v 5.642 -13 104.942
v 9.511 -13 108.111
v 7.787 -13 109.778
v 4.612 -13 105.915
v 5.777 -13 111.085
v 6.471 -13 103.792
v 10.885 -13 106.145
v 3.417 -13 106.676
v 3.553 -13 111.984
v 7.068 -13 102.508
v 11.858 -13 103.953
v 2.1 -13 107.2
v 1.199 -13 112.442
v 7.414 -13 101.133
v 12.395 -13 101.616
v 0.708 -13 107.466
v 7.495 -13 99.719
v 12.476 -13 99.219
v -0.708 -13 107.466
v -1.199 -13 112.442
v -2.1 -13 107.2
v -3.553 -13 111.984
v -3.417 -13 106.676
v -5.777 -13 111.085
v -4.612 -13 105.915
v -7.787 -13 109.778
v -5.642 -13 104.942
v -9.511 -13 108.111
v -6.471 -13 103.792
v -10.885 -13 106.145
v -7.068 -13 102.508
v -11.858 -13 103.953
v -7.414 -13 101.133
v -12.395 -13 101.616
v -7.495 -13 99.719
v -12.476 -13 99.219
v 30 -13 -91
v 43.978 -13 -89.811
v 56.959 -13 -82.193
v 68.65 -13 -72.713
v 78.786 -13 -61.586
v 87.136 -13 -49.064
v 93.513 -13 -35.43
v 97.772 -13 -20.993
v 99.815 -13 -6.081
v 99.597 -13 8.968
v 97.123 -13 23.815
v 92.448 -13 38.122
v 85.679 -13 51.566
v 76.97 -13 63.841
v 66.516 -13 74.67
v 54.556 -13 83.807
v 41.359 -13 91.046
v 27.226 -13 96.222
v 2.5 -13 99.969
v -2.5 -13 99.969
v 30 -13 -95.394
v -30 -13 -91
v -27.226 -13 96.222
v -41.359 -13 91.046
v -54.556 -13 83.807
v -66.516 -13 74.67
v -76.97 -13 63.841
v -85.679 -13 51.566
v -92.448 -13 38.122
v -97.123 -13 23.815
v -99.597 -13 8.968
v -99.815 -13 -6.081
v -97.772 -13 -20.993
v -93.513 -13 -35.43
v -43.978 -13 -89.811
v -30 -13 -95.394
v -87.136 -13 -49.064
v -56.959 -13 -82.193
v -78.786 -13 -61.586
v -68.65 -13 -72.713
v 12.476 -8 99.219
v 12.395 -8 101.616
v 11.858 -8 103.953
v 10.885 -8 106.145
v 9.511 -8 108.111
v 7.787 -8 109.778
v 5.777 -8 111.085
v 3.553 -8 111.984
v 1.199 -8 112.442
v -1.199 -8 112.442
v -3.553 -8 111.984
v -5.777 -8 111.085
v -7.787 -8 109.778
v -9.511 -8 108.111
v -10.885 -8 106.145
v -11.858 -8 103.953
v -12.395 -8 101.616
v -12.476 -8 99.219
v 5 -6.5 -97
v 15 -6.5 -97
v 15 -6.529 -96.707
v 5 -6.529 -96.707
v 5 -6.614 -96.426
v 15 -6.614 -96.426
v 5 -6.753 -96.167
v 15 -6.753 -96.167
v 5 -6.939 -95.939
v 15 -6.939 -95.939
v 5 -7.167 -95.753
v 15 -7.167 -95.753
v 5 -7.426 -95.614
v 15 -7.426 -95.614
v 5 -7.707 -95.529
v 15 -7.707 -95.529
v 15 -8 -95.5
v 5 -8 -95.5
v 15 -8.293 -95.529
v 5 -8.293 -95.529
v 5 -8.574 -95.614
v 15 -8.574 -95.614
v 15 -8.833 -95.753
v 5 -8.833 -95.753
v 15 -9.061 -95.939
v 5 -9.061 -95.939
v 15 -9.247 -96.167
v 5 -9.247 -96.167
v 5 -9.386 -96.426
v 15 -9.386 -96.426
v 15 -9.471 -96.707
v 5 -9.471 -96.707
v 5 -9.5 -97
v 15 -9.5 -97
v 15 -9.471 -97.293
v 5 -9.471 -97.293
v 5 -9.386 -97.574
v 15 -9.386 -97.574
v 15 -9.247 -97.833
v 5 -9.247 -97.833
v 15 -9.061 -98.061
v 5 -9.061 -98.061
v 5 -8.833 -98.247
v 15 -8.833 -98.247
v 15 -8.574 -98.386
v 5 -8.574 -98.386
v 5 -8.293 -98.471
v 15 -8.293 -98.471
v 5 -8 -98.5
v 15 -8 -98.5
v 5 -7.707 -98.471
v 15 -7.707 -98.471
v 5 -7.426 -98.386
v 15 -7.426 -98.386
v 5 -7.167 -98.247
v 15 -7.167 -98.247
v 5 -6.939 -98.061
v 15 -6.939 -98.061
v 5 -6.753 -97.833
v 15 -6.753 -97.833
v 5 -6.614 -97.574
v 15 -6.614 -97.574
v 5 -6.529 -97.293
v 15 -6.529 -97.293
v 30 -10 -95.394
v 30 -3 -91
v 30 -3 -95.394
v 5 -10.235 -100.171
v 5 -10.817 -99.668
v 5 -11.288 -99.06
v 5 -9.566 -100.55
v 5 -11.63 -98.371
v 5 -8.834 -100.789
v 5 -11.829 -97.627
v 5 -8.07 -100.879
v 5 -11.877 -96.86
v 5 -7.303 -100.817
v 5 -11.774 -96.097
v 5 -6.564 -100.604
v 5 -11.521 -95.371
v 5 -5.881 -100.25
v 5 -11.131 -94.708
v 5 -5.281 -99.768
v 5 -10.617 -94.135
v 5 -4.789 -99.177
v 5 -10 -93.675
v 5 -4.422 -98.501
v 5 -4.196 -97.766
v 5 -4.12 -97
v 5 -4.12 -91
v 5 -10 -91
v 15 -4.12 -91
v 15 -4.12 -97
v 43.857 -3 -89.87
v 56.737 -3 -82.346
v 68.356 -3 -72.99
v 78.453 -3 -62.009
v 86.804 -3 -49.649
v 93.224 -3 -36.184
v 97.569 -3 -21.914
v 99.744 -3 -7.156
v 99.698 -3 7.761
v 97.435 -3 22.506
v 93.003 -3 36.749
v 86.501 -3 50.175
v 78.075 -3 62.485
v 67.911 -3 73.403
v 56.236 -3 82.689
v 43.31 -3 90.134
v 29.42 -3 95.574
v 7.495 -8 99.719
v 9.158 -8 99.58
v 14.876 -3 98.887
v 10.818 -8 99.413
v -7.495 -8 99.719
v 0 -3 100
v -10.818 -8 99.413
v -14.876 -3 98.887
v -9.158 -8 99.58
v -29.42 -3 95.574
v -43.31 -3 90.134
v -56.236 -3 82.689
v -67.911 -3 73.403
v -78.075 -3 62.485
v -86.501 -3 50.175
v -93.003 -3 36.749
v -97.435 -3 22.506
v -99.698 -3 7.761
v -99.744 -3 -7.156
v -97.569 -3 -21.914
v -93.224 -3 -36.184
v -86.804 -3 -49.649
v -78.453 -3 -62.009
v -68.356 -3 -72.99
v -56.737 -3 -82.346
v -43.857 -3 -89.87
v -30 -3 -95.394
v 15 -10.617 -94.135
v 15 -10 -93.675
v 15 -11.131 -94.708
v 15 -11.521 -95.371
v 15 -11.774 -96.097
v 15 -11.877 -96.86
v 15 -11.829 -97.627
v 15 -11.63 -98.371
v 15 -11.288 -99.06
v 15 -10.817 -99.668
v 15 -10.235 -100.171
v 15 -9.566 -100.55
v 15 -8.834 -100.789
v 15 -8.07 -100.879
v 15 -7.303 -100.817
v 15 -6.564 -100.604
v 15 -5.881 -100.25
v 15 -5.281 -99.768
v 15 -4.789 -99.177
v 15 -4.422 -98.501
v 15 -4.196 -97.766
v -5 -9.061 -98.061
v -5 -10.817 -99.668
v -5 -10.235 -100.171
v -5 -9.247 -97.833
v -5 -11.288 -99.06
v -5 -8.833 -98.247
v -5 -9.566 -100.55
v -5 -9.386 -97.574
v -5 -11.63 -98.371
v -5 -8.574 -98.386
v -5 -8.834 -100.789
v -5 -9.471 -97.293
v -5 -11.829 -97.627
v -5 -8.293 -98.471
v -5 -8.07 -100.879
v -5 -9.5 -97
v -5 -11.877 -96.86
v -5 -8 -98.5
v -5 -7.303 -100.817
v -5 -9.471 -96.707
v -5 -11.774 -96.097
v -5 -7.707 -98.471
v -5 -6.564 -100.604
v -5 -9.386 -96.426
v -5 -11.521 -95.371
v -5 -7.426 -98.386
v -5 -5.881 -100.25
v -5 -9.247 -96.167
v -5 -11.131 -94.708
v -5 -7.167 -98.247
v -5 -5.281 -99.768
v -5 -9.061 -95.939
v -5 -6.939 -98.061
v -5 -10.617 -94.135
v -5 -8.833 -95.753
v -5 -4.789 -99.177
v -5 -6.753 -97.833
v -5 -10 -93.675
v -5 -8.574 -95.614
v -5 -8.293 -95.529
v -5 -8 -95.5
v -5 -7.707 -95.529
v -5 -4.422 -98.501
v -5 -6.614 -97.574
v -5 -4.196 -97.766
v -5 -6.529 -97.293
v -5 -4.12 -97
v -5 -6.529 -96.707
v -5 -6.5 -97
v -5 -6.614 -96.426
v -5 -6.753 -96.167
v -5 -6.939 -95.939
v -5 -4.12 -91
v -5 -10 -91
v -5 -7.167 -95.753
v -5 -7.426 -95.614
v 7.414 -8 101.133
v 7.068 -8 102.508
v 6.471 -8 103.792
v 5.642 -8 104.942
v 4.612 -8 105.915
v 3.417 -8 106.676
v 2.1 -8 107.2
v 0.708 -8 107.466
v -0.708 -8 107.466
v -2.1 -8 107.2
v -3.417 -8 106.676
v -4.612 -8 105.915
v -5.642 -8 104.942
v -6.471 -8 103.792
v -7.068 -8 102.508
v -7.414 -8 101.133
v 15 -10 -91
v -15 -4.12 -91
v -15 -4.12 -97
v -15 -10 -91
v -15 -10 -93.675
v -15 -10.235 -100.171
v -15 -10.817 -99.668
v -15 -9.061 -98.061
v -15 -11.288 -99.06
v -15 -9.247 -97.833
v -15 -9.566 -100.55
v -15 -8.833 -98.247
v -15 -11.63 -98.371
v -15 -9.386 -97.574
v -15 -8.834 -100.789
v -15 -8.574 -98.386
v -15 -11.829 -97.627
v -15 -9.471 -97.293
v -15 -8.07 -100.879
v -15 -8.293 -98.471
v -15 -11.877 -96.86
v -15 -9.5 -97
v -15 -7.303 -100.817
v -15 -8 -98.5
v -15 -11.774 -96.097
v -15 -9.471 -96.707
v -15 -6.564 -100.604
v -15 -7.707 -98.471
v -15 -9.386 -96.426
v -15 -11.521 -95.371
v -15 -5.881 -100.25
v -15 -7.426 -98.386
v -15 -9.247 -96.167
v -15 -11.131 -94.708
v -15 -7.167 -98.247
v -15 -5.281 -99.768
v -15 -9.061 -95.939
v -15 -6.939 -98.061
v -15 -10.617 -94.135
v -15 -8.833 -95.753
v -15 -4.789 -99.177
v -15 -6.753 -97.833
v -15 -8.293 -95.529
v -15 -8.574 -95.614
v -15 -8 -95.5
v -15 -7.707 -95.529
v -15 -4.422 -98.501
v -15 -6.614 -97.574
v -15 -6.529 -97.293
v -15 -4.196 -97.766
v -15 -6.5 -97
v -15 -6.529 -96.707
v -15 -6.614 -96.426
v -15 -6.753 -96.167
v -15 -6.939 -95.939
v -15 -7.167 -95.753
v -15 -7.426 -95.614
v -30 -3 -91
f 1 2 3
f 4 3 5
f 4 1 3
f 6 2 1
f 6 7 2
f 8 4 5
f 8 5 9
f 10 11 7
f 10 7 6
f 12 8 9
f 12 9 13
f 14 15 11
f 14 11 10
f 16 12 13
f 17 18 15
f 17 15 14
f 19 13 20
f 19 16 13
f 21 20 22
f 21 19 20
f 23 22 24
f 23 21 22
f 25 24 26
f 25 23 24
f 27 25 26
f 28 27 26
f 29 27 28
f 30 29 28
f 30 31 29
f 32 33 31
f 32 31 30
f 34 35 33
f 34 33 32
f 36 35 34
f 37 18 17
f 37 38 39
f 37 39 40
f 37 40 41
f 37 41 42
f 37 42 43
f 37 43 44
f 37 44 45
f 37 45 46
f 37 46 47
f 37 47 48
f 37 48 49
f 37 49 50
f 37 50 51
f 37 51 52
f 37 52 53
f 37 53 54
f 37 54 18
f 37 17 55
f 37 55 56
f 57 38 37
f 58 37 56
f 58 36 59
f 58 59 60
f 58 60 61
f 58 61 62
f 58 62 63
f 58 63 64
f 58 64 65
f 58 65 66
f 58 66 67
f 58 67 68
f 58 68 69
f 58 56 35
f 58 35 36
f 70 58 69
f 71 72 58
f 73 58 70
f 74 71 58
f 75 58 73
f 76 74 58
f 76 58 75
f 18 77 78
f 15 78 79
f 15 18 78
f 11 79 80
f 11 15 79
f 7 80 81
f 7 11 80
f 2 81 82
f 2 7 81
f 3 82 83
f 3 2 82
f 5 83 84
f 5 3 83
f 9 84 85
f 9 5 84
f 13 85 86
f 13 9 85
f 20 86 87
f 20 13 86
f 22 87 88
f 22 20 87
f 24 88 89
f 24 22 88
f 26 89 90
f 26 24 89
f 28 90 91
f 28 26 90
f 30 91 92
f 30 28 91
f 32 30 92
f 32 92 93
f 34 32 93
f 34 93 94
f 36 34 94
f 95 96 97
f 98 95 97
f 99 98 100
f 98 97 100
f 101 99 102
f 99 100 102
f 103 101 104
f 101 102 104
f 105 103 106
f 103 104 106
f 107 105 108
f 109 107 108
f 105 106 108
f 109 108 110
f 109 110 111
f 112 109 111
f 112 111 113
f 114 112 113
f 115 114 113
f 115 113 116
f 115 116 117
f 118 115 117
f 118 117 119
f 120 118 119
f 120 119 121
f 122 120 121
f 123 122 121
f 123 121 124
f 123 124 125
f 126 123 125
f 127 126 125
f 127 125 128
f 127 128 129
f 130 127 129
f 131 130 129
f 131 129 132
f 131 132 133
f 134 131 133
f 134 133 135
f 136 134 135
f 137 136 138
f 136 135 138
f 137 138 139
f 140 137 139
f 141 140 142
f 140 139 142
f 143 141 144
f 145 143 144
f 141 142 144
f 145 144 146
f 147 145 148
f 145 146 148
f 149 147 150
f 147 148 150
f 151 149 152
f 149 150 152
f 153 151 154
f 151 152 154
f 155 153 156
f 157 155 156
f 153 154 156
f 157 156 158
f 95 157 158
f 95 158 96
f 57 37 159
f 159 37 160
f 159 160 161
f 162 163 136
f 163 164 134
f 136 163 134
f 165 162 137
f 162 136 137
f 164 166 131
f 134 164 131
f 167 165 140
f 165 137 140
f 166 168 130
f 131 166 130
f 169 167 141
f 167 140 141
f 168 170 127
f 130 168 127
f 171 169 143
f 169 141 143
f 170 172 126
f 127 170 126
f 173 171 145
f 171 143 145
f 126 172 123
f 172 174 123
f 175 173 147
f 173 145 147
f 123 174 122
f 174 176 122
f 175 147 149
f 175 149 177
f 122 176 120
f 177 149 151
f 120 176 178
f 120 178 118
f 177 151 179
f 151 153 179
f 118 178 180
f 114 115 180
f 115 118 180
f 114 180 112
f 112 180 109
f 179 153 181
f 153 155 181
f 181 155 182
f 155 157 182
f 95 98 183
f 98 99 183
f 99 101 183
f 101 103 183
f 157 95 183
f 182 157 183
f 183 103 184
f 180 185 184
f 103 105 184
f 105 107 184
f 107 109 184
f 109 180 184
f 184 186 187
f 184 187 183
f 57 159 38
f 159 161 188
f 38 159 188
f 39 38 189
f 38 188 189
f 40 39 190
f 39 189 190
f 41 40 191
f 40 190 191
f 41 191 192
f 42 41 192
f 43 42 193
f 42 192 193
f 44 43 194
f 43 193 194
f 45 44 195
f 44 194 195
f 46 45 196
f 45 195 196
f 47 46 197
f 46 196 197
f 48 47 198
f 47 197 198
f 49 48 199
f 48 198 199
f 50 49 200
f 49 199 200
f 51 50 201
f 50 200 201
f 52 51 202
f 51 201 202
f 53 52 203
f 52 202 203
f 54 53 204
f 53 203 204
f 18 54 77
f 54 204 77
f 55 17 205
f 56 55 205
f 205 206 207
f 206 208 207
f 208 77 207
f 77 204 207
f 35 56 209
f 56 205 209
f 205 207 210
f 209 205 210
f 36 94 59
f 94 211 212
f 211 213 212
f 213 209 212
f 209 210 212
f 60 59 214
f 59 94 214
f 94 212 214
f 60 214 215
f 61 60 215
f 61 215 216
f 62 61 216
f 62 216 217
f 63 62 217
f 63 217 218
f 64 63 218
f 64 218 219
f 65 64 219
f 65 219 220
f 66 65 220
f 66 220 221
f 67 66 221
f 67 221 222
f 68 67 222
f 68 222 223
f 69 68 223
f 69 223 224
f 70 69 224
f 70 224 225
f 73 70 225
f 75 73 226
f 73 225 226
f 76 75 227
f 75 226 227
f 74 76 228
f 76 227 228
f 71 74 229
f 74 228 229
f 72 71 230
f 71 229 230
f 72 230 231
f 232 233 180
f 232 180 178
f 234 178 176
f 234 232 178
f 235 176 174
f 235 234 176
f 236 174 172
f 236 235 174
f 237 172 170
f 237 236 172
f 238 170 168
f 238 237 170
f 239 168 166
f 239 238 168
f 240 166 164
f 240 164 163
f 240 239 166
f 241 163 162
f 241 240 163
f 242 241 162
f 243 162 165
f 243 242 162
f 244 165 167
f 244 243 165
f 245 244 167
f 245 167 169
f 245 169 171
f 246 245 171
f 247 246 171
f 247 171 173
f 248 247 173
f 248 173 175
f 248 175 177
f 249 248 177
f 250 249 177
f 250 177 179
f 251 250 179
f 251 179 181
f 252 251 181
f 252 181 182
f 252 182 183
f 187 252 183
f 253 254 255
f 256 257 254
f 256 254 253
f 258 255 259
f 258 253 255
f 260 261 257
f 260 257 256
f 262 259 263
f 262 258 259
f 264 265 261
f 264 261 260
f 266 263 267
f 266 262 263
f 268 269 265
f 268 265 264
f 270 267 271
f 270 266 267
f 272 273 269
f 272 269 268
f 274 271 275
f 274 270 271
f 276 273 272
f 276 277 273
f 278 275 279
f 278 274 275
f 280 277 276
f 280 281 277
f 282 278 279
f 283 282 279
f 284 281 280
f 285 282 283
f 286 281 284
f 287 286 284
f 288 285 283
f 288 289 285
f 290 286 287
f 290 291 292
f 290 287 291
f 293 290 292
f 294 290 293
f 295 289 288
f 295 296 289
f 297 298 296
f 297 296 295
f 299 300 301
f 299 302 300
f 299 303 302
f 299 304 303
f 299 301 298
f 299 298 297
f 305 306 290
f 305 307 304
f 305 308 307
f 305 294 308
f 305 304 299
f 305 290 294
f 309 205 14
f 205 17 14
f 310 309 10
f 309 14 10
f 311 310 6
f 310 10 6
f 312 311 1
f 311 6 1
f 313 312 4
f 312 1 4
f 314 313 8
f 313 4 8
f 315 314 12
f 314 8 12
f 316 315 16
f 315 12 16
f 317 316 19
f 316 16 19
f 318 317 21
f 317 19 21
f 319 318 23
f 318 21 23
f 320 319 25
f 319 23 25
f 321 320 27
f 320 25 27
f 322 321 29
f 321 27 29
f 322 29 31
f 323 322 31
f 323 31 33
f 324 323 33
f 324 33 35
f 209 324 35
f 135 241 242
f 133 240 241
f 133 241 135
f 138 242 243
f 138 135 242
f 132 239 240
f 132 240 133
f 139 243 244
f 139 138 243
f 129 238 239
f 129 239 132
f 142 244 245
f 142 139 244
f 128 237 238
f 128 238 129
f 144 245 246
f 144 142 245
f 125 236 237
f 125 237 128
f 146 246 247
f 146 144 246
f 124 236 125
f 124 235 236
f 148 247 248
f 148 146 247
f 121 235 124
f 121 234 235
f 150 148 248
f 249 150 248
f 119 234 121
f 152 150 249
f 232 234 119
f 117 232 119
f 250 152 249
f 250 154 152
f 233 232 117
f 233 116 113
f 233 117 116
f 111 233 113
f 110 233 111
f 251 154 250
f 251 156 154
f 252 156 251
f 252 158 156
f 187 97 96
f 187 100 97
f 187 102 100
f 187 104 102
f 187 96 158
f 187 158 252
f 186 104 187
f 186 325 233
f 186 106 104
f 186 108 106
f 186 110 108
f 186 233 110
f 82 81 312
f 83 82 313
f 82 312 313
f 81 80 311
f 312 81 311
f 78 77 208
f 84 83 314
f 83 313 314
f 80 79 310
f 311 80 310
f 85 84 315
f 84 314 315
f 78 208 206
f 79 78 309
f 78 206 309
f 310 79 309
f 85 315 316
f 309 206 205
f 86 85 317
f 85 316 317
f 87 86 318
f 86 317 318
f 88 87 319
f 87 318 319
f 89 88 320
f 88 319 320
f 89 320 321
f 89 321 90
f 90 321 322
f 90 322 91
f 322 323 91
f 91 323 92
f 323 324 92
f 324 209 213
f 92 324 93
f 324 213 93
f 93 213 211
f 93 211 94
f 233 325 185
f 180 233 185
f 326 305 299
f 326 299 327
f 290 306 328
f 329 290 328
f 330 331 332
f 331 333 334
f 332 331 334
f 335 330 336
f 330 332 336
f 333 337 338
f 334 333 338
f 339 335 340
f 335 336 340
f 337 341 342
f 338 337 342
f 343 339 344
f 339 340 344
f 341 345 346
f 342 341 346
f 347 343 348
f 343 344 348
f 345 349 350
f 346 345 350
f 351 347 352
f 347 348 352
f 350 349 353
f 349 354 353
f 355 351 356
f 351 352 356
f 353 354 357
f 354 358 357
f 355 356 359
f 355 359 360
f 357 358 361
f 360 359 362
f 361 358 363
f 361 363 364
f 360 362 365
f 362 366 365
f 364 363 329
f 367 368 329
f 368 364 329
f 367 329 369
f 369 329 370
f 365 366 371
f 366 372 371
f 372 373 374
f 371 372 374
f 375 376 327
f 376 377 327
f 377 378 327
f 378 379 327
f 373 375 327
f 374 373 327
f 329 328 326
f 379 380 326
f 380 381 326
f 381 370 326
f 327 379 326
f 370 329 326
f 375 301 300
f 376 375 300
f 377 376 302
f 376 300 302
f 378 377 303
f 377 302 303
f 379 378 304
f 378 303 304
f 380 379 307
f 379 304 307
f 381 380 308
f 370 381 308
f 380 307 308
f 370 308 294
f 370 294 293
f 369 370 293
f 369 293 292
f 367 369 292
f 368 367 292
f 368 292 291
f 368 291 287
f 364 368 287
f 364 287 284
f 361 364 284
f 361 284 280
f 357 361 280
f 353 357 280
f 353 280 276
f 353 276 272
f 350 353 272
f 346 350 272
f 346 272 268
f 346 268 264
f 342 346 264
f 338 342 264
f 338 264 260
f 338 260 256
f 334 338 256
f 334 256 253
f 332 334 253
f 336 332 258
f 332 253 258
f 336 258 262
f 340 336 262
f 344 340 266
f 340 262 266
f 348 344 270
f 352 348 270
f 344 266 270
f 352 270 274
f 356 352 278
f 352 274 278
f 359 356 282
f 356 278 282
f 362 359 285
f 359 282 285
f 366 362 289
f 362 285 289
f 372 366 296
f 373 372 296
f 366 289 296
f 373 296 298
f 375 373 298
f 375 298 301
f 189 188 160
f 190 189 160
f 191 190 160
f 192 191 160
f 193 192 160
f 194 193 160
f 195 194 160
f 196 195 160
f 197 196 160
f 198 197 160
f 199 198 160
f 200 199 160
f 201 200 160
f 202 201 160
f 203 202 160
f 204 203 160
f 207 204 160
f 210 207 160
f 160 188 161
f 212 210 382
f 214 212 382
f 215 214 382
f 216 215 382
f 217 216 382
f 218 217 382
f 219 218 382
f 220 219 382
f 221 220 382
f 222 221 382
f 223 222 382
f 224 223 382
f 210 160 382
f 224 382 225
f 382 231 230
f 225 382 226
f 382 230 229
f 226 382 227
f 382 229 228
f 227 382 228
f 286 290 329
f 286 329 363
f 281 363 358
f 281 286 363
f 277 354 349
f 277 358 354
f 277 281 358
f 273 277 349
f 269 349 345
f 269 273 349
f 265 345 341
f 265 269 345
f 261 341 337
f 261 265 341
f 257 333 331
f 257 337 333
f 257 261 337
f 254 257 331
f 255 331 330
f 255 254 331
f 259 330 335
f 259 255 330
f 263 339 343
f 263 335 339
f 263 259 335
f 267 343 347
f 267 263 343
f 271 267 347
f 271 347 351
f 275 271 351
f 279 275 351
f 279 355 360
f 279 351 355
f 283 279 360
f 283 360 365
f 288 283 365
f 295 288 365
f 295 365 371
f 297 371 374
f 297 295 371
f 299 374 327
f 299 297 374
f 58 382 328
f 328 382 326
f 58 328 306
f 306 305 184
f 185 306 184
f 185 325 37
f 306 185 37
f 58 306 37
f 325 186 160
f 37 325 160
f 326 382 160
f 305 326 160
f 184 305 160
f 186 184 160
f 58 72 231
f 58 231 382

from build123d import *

# Parameters (mm, degrees)
SKETCH1_R            = 100
BOSS_EXTRUDE1_DEPTH  = 10
SKETCH3_W            = 60
SKETCH3_H            = 18
CUT_EXTRUDE1_DEPTH   = 142.774468788
SKETCH4_W            = 10
SKETCH4_H            = 5.88
BOSS_EXTRUDE2_DEPTH  = 2.12
SKETCH5_R            = 3.88
BOSS_EXTRUDE3_DEPTH  = 10
SKETCH6_R            = 3.88
BOSS_EXTRUDE4_DEPTH  = 10
SKETCH7_R            = 1.5
CUT_EXTRUDE2_DEPTH   = 154.436986415
BOSS_EXTRUDE5_REACH  = 219.799
SKETCH8_W            = 10
SKETCH8_H            = 5.88
BOSS_EXTRUDE6_REACH  = 219.799
SKETCH9_W            = 10
SKETCH9_H            = 5.88
BOSS_EXTRUDE8_DEPTH  = 3
CUT_EXTRUDE3_DEPTH   = 3
SKETCH22_R           = 12.5
SKETCH22_R_2         = 7.5
BOSS_EXTRUDE10_DEPTH = 5


with BuildPart() as part:
    # Sketch1 → Boss-Extrude1 (new body)
    with BuildSketch(Plane(origin=(0, 0, 0), x_dir=(1, 0, 0), z_dir=(0, 1, 0))):
        with Locations(Location((0, 0, 0), (0, 0, 270))):
            Circle(SKETCH1_R)
    extrude(amount=-BOSS_EXTRUDE1_DEPTH)

    # Sketch3 → Cut-Extrude1 (cut, through all)
    with BuildSketch(Plane(origin=(0, 0, 0), x_dir=(1, 0, 0), z_dir=(0, 1, 0))):
        with Locations((0, 100)):
            Rectangle(SKETCH3_W, SKETCH3_H)
    extrude(amount=-CUT_EXTRUDE1_DEPTH, mode=Mode.SUBTRACT)

    # Sketch4 → Boss-Extrude2 (add)
    with BuildSketch(Plane(origin=(0, 0, -91), x_dir=(-1, 0, 0), z_dir=(0, 0, -1))):
        with Locations((10, -7.06)):
            Rectangle(SKETCH4_W, SKETCH4_H)
        with Locations((-10, -7.06)):
            Rectangle(SKETCH4_W, SKETCH4_H)
    extrude(amount=BOSS_EXTRUDE2_DEPTH)


with BuildPart() as body_2:
    # Sketch5 → Boss-Extrude3 (new body)
    with BuildSketch(Plane(origin=(-5, 0, 0), x_dir=(0, 0, -1), z_dir=(1, 0, 0))):
        with Locations((97, -8)):
            Circle(SKETCH5_R)
    extrude(amount=-BOSS_EXTRUDE3_DEPTH)


with BuildPart() as body_3:
    # Sketch6 → Boss-Extrude4 (new body)
    with BuildSketch(Plane(origin=(15, 0, 0), x_dir=(0, 0, -1), z_dir=(1, 0, 0))):
        with Locations(Location((97, -8, 0), (0, 0, 90))):
            Circle(SKETCH6_R)
    extrude(amount=-BOSS_EXTRUDE4_DEPTH)


with BuildPart() as cut_extrude2_tool:
    # Sketch7 → Cut-Extrude2 (new, through all)
    with BuildSketch(Plane(origin=(15, 0, 0), x_dir=(0, 0, -1), z_dir=(1, 0, 0))):
        with Locations(Location((97, -8, 0), (0, 0, 90))):
            Circle(SKETCH7_R)
    extrude(amount=-CUT_EXTRUDE2_DEPTH)


with BuildPart() as body_2_1:
    add(body_2.part)

    # Cut-Extrude2: cut by cut_extrude2_tool
    add(cut_extrude2_tool.part, mode=Mode.SUBTRACT)

    # Sketch8 → Boss-Extrude5 (add, up to next)
    with BuildSketch(Plane(origin=(0, 0, -93.12), x_dir=(-1, 0, 0), z_dir=(0, 0, -1)), mode=Mode.PRIVATE) as boss_extrude5_sk1:
        with Locations((10, -7.06)):
            Rectangle(SKETCH8_W, SKETCH8_H)
    boss_extrude5_tool1 = extrude(boss_extrude5_sk1.sketch, amount=BOSS_EXTRUDE5_REACH, mode=Mode.PRIVATE) - body_2_1.part

    add(part.part)  # Boss-Extrude5 merges part
    add(boss_extrude5_tool1.solids().sort_by_distance((-10, -7.06, -93.12))[0])
    add(boss_extrude5_tool1.solids().sort_by_distance((-10, -7.06, -93.12))[1])


with BuildPart() as body_3_1:
    add(body_3.part)

    # Cut-Extrude2: cut by cut_extrude2_tool
    add(cut_extrude2_tool.part, mode=Mode.SUBTRACT)

    # Sketch9 → Boss-Extrude6 (add, up to next)
    with BuildSketch(Plane(origin=(0, 0, -93.12), x_dir=(-1, 0, 0), z_dir=(0, 0, -1)), mode=Mode.PRIVATE) as boss_extrude6_sk1:
        with Locations((-10, -7.06)):
            Rectangle(SKETCH9_W, SKETCH9_H)
    boss_extrude6_tool1 = extrude(boss_extrude6_sk1.sketch, amount=BOSS_EXTRUDE6_REACH, mode=Mode.PRIVATE) - body_3_1.part

    add(body_2_1.part)  # Boss-Extrude6 merges body 2
    add(boss_extrude6_tool1.solids().sort_by_distance((10, -7.06, -93.12))[0])
    add(boss_extrude6_tool1.solids().sort_by_distance((10, -7.06, -93.12))[1])

    # Sketch12 → Boss-Extrude8 (add)
    with BuildSketch(Plane(origin=(0, -10, 0), x_dir=(-1, 0, 0), z_dir=(0, -1, 0))):
        with BuildLine():
            Line((30, 95.393920142), (30, 91))
            Line((30, 91), (-30, 91))
            Line((-30, 91), (-30, 95.393920142))
            ThreePointArc((-30, 95.393920142), (0, -100), (30, 95.393920142))
        make_face()
    extrude(amount=BOSS_EXTRUDE8_DEPTH)

    # Sketch13 → Cut-Extrude3 (cut)
    with BuildSketch(Plane(origin=(0, 0, 0), x_dir=(1, 0, 0), z_dir=(0, 1, 0))):
        with BuildLine():
            Line((-30, 95.393920142), (-30, 91))
            Line((-30, 91), (30, 91))
            Line((30, 91), (30, 95.393920142))
            ThreePointArc((30, 95.393920142), (0, -100), (-30, 95.393920142))
        make_face()
    extrude(amount=-CUT_EXTRUDE3_DEPTH, mode=Mode.SUBTRACT)

    # Sketch22 → Boss-Extrude10 (add)
    with BuildSketch(Plane(origin=(0, -13, 0), x_dir=(-1, 0, 0), z_dir=(0, -1, 0))):
        with Locations((0, -100)):
            Circle(SKETCH22_R)
        with Locations((0, -100)):
            Circle(SKETCH22_R_2, mode=Mode.SUBTRACT)
    extrude(amount=-BOSS_EXTRUDE10_DEPTH)


solid = body_3_1.part
